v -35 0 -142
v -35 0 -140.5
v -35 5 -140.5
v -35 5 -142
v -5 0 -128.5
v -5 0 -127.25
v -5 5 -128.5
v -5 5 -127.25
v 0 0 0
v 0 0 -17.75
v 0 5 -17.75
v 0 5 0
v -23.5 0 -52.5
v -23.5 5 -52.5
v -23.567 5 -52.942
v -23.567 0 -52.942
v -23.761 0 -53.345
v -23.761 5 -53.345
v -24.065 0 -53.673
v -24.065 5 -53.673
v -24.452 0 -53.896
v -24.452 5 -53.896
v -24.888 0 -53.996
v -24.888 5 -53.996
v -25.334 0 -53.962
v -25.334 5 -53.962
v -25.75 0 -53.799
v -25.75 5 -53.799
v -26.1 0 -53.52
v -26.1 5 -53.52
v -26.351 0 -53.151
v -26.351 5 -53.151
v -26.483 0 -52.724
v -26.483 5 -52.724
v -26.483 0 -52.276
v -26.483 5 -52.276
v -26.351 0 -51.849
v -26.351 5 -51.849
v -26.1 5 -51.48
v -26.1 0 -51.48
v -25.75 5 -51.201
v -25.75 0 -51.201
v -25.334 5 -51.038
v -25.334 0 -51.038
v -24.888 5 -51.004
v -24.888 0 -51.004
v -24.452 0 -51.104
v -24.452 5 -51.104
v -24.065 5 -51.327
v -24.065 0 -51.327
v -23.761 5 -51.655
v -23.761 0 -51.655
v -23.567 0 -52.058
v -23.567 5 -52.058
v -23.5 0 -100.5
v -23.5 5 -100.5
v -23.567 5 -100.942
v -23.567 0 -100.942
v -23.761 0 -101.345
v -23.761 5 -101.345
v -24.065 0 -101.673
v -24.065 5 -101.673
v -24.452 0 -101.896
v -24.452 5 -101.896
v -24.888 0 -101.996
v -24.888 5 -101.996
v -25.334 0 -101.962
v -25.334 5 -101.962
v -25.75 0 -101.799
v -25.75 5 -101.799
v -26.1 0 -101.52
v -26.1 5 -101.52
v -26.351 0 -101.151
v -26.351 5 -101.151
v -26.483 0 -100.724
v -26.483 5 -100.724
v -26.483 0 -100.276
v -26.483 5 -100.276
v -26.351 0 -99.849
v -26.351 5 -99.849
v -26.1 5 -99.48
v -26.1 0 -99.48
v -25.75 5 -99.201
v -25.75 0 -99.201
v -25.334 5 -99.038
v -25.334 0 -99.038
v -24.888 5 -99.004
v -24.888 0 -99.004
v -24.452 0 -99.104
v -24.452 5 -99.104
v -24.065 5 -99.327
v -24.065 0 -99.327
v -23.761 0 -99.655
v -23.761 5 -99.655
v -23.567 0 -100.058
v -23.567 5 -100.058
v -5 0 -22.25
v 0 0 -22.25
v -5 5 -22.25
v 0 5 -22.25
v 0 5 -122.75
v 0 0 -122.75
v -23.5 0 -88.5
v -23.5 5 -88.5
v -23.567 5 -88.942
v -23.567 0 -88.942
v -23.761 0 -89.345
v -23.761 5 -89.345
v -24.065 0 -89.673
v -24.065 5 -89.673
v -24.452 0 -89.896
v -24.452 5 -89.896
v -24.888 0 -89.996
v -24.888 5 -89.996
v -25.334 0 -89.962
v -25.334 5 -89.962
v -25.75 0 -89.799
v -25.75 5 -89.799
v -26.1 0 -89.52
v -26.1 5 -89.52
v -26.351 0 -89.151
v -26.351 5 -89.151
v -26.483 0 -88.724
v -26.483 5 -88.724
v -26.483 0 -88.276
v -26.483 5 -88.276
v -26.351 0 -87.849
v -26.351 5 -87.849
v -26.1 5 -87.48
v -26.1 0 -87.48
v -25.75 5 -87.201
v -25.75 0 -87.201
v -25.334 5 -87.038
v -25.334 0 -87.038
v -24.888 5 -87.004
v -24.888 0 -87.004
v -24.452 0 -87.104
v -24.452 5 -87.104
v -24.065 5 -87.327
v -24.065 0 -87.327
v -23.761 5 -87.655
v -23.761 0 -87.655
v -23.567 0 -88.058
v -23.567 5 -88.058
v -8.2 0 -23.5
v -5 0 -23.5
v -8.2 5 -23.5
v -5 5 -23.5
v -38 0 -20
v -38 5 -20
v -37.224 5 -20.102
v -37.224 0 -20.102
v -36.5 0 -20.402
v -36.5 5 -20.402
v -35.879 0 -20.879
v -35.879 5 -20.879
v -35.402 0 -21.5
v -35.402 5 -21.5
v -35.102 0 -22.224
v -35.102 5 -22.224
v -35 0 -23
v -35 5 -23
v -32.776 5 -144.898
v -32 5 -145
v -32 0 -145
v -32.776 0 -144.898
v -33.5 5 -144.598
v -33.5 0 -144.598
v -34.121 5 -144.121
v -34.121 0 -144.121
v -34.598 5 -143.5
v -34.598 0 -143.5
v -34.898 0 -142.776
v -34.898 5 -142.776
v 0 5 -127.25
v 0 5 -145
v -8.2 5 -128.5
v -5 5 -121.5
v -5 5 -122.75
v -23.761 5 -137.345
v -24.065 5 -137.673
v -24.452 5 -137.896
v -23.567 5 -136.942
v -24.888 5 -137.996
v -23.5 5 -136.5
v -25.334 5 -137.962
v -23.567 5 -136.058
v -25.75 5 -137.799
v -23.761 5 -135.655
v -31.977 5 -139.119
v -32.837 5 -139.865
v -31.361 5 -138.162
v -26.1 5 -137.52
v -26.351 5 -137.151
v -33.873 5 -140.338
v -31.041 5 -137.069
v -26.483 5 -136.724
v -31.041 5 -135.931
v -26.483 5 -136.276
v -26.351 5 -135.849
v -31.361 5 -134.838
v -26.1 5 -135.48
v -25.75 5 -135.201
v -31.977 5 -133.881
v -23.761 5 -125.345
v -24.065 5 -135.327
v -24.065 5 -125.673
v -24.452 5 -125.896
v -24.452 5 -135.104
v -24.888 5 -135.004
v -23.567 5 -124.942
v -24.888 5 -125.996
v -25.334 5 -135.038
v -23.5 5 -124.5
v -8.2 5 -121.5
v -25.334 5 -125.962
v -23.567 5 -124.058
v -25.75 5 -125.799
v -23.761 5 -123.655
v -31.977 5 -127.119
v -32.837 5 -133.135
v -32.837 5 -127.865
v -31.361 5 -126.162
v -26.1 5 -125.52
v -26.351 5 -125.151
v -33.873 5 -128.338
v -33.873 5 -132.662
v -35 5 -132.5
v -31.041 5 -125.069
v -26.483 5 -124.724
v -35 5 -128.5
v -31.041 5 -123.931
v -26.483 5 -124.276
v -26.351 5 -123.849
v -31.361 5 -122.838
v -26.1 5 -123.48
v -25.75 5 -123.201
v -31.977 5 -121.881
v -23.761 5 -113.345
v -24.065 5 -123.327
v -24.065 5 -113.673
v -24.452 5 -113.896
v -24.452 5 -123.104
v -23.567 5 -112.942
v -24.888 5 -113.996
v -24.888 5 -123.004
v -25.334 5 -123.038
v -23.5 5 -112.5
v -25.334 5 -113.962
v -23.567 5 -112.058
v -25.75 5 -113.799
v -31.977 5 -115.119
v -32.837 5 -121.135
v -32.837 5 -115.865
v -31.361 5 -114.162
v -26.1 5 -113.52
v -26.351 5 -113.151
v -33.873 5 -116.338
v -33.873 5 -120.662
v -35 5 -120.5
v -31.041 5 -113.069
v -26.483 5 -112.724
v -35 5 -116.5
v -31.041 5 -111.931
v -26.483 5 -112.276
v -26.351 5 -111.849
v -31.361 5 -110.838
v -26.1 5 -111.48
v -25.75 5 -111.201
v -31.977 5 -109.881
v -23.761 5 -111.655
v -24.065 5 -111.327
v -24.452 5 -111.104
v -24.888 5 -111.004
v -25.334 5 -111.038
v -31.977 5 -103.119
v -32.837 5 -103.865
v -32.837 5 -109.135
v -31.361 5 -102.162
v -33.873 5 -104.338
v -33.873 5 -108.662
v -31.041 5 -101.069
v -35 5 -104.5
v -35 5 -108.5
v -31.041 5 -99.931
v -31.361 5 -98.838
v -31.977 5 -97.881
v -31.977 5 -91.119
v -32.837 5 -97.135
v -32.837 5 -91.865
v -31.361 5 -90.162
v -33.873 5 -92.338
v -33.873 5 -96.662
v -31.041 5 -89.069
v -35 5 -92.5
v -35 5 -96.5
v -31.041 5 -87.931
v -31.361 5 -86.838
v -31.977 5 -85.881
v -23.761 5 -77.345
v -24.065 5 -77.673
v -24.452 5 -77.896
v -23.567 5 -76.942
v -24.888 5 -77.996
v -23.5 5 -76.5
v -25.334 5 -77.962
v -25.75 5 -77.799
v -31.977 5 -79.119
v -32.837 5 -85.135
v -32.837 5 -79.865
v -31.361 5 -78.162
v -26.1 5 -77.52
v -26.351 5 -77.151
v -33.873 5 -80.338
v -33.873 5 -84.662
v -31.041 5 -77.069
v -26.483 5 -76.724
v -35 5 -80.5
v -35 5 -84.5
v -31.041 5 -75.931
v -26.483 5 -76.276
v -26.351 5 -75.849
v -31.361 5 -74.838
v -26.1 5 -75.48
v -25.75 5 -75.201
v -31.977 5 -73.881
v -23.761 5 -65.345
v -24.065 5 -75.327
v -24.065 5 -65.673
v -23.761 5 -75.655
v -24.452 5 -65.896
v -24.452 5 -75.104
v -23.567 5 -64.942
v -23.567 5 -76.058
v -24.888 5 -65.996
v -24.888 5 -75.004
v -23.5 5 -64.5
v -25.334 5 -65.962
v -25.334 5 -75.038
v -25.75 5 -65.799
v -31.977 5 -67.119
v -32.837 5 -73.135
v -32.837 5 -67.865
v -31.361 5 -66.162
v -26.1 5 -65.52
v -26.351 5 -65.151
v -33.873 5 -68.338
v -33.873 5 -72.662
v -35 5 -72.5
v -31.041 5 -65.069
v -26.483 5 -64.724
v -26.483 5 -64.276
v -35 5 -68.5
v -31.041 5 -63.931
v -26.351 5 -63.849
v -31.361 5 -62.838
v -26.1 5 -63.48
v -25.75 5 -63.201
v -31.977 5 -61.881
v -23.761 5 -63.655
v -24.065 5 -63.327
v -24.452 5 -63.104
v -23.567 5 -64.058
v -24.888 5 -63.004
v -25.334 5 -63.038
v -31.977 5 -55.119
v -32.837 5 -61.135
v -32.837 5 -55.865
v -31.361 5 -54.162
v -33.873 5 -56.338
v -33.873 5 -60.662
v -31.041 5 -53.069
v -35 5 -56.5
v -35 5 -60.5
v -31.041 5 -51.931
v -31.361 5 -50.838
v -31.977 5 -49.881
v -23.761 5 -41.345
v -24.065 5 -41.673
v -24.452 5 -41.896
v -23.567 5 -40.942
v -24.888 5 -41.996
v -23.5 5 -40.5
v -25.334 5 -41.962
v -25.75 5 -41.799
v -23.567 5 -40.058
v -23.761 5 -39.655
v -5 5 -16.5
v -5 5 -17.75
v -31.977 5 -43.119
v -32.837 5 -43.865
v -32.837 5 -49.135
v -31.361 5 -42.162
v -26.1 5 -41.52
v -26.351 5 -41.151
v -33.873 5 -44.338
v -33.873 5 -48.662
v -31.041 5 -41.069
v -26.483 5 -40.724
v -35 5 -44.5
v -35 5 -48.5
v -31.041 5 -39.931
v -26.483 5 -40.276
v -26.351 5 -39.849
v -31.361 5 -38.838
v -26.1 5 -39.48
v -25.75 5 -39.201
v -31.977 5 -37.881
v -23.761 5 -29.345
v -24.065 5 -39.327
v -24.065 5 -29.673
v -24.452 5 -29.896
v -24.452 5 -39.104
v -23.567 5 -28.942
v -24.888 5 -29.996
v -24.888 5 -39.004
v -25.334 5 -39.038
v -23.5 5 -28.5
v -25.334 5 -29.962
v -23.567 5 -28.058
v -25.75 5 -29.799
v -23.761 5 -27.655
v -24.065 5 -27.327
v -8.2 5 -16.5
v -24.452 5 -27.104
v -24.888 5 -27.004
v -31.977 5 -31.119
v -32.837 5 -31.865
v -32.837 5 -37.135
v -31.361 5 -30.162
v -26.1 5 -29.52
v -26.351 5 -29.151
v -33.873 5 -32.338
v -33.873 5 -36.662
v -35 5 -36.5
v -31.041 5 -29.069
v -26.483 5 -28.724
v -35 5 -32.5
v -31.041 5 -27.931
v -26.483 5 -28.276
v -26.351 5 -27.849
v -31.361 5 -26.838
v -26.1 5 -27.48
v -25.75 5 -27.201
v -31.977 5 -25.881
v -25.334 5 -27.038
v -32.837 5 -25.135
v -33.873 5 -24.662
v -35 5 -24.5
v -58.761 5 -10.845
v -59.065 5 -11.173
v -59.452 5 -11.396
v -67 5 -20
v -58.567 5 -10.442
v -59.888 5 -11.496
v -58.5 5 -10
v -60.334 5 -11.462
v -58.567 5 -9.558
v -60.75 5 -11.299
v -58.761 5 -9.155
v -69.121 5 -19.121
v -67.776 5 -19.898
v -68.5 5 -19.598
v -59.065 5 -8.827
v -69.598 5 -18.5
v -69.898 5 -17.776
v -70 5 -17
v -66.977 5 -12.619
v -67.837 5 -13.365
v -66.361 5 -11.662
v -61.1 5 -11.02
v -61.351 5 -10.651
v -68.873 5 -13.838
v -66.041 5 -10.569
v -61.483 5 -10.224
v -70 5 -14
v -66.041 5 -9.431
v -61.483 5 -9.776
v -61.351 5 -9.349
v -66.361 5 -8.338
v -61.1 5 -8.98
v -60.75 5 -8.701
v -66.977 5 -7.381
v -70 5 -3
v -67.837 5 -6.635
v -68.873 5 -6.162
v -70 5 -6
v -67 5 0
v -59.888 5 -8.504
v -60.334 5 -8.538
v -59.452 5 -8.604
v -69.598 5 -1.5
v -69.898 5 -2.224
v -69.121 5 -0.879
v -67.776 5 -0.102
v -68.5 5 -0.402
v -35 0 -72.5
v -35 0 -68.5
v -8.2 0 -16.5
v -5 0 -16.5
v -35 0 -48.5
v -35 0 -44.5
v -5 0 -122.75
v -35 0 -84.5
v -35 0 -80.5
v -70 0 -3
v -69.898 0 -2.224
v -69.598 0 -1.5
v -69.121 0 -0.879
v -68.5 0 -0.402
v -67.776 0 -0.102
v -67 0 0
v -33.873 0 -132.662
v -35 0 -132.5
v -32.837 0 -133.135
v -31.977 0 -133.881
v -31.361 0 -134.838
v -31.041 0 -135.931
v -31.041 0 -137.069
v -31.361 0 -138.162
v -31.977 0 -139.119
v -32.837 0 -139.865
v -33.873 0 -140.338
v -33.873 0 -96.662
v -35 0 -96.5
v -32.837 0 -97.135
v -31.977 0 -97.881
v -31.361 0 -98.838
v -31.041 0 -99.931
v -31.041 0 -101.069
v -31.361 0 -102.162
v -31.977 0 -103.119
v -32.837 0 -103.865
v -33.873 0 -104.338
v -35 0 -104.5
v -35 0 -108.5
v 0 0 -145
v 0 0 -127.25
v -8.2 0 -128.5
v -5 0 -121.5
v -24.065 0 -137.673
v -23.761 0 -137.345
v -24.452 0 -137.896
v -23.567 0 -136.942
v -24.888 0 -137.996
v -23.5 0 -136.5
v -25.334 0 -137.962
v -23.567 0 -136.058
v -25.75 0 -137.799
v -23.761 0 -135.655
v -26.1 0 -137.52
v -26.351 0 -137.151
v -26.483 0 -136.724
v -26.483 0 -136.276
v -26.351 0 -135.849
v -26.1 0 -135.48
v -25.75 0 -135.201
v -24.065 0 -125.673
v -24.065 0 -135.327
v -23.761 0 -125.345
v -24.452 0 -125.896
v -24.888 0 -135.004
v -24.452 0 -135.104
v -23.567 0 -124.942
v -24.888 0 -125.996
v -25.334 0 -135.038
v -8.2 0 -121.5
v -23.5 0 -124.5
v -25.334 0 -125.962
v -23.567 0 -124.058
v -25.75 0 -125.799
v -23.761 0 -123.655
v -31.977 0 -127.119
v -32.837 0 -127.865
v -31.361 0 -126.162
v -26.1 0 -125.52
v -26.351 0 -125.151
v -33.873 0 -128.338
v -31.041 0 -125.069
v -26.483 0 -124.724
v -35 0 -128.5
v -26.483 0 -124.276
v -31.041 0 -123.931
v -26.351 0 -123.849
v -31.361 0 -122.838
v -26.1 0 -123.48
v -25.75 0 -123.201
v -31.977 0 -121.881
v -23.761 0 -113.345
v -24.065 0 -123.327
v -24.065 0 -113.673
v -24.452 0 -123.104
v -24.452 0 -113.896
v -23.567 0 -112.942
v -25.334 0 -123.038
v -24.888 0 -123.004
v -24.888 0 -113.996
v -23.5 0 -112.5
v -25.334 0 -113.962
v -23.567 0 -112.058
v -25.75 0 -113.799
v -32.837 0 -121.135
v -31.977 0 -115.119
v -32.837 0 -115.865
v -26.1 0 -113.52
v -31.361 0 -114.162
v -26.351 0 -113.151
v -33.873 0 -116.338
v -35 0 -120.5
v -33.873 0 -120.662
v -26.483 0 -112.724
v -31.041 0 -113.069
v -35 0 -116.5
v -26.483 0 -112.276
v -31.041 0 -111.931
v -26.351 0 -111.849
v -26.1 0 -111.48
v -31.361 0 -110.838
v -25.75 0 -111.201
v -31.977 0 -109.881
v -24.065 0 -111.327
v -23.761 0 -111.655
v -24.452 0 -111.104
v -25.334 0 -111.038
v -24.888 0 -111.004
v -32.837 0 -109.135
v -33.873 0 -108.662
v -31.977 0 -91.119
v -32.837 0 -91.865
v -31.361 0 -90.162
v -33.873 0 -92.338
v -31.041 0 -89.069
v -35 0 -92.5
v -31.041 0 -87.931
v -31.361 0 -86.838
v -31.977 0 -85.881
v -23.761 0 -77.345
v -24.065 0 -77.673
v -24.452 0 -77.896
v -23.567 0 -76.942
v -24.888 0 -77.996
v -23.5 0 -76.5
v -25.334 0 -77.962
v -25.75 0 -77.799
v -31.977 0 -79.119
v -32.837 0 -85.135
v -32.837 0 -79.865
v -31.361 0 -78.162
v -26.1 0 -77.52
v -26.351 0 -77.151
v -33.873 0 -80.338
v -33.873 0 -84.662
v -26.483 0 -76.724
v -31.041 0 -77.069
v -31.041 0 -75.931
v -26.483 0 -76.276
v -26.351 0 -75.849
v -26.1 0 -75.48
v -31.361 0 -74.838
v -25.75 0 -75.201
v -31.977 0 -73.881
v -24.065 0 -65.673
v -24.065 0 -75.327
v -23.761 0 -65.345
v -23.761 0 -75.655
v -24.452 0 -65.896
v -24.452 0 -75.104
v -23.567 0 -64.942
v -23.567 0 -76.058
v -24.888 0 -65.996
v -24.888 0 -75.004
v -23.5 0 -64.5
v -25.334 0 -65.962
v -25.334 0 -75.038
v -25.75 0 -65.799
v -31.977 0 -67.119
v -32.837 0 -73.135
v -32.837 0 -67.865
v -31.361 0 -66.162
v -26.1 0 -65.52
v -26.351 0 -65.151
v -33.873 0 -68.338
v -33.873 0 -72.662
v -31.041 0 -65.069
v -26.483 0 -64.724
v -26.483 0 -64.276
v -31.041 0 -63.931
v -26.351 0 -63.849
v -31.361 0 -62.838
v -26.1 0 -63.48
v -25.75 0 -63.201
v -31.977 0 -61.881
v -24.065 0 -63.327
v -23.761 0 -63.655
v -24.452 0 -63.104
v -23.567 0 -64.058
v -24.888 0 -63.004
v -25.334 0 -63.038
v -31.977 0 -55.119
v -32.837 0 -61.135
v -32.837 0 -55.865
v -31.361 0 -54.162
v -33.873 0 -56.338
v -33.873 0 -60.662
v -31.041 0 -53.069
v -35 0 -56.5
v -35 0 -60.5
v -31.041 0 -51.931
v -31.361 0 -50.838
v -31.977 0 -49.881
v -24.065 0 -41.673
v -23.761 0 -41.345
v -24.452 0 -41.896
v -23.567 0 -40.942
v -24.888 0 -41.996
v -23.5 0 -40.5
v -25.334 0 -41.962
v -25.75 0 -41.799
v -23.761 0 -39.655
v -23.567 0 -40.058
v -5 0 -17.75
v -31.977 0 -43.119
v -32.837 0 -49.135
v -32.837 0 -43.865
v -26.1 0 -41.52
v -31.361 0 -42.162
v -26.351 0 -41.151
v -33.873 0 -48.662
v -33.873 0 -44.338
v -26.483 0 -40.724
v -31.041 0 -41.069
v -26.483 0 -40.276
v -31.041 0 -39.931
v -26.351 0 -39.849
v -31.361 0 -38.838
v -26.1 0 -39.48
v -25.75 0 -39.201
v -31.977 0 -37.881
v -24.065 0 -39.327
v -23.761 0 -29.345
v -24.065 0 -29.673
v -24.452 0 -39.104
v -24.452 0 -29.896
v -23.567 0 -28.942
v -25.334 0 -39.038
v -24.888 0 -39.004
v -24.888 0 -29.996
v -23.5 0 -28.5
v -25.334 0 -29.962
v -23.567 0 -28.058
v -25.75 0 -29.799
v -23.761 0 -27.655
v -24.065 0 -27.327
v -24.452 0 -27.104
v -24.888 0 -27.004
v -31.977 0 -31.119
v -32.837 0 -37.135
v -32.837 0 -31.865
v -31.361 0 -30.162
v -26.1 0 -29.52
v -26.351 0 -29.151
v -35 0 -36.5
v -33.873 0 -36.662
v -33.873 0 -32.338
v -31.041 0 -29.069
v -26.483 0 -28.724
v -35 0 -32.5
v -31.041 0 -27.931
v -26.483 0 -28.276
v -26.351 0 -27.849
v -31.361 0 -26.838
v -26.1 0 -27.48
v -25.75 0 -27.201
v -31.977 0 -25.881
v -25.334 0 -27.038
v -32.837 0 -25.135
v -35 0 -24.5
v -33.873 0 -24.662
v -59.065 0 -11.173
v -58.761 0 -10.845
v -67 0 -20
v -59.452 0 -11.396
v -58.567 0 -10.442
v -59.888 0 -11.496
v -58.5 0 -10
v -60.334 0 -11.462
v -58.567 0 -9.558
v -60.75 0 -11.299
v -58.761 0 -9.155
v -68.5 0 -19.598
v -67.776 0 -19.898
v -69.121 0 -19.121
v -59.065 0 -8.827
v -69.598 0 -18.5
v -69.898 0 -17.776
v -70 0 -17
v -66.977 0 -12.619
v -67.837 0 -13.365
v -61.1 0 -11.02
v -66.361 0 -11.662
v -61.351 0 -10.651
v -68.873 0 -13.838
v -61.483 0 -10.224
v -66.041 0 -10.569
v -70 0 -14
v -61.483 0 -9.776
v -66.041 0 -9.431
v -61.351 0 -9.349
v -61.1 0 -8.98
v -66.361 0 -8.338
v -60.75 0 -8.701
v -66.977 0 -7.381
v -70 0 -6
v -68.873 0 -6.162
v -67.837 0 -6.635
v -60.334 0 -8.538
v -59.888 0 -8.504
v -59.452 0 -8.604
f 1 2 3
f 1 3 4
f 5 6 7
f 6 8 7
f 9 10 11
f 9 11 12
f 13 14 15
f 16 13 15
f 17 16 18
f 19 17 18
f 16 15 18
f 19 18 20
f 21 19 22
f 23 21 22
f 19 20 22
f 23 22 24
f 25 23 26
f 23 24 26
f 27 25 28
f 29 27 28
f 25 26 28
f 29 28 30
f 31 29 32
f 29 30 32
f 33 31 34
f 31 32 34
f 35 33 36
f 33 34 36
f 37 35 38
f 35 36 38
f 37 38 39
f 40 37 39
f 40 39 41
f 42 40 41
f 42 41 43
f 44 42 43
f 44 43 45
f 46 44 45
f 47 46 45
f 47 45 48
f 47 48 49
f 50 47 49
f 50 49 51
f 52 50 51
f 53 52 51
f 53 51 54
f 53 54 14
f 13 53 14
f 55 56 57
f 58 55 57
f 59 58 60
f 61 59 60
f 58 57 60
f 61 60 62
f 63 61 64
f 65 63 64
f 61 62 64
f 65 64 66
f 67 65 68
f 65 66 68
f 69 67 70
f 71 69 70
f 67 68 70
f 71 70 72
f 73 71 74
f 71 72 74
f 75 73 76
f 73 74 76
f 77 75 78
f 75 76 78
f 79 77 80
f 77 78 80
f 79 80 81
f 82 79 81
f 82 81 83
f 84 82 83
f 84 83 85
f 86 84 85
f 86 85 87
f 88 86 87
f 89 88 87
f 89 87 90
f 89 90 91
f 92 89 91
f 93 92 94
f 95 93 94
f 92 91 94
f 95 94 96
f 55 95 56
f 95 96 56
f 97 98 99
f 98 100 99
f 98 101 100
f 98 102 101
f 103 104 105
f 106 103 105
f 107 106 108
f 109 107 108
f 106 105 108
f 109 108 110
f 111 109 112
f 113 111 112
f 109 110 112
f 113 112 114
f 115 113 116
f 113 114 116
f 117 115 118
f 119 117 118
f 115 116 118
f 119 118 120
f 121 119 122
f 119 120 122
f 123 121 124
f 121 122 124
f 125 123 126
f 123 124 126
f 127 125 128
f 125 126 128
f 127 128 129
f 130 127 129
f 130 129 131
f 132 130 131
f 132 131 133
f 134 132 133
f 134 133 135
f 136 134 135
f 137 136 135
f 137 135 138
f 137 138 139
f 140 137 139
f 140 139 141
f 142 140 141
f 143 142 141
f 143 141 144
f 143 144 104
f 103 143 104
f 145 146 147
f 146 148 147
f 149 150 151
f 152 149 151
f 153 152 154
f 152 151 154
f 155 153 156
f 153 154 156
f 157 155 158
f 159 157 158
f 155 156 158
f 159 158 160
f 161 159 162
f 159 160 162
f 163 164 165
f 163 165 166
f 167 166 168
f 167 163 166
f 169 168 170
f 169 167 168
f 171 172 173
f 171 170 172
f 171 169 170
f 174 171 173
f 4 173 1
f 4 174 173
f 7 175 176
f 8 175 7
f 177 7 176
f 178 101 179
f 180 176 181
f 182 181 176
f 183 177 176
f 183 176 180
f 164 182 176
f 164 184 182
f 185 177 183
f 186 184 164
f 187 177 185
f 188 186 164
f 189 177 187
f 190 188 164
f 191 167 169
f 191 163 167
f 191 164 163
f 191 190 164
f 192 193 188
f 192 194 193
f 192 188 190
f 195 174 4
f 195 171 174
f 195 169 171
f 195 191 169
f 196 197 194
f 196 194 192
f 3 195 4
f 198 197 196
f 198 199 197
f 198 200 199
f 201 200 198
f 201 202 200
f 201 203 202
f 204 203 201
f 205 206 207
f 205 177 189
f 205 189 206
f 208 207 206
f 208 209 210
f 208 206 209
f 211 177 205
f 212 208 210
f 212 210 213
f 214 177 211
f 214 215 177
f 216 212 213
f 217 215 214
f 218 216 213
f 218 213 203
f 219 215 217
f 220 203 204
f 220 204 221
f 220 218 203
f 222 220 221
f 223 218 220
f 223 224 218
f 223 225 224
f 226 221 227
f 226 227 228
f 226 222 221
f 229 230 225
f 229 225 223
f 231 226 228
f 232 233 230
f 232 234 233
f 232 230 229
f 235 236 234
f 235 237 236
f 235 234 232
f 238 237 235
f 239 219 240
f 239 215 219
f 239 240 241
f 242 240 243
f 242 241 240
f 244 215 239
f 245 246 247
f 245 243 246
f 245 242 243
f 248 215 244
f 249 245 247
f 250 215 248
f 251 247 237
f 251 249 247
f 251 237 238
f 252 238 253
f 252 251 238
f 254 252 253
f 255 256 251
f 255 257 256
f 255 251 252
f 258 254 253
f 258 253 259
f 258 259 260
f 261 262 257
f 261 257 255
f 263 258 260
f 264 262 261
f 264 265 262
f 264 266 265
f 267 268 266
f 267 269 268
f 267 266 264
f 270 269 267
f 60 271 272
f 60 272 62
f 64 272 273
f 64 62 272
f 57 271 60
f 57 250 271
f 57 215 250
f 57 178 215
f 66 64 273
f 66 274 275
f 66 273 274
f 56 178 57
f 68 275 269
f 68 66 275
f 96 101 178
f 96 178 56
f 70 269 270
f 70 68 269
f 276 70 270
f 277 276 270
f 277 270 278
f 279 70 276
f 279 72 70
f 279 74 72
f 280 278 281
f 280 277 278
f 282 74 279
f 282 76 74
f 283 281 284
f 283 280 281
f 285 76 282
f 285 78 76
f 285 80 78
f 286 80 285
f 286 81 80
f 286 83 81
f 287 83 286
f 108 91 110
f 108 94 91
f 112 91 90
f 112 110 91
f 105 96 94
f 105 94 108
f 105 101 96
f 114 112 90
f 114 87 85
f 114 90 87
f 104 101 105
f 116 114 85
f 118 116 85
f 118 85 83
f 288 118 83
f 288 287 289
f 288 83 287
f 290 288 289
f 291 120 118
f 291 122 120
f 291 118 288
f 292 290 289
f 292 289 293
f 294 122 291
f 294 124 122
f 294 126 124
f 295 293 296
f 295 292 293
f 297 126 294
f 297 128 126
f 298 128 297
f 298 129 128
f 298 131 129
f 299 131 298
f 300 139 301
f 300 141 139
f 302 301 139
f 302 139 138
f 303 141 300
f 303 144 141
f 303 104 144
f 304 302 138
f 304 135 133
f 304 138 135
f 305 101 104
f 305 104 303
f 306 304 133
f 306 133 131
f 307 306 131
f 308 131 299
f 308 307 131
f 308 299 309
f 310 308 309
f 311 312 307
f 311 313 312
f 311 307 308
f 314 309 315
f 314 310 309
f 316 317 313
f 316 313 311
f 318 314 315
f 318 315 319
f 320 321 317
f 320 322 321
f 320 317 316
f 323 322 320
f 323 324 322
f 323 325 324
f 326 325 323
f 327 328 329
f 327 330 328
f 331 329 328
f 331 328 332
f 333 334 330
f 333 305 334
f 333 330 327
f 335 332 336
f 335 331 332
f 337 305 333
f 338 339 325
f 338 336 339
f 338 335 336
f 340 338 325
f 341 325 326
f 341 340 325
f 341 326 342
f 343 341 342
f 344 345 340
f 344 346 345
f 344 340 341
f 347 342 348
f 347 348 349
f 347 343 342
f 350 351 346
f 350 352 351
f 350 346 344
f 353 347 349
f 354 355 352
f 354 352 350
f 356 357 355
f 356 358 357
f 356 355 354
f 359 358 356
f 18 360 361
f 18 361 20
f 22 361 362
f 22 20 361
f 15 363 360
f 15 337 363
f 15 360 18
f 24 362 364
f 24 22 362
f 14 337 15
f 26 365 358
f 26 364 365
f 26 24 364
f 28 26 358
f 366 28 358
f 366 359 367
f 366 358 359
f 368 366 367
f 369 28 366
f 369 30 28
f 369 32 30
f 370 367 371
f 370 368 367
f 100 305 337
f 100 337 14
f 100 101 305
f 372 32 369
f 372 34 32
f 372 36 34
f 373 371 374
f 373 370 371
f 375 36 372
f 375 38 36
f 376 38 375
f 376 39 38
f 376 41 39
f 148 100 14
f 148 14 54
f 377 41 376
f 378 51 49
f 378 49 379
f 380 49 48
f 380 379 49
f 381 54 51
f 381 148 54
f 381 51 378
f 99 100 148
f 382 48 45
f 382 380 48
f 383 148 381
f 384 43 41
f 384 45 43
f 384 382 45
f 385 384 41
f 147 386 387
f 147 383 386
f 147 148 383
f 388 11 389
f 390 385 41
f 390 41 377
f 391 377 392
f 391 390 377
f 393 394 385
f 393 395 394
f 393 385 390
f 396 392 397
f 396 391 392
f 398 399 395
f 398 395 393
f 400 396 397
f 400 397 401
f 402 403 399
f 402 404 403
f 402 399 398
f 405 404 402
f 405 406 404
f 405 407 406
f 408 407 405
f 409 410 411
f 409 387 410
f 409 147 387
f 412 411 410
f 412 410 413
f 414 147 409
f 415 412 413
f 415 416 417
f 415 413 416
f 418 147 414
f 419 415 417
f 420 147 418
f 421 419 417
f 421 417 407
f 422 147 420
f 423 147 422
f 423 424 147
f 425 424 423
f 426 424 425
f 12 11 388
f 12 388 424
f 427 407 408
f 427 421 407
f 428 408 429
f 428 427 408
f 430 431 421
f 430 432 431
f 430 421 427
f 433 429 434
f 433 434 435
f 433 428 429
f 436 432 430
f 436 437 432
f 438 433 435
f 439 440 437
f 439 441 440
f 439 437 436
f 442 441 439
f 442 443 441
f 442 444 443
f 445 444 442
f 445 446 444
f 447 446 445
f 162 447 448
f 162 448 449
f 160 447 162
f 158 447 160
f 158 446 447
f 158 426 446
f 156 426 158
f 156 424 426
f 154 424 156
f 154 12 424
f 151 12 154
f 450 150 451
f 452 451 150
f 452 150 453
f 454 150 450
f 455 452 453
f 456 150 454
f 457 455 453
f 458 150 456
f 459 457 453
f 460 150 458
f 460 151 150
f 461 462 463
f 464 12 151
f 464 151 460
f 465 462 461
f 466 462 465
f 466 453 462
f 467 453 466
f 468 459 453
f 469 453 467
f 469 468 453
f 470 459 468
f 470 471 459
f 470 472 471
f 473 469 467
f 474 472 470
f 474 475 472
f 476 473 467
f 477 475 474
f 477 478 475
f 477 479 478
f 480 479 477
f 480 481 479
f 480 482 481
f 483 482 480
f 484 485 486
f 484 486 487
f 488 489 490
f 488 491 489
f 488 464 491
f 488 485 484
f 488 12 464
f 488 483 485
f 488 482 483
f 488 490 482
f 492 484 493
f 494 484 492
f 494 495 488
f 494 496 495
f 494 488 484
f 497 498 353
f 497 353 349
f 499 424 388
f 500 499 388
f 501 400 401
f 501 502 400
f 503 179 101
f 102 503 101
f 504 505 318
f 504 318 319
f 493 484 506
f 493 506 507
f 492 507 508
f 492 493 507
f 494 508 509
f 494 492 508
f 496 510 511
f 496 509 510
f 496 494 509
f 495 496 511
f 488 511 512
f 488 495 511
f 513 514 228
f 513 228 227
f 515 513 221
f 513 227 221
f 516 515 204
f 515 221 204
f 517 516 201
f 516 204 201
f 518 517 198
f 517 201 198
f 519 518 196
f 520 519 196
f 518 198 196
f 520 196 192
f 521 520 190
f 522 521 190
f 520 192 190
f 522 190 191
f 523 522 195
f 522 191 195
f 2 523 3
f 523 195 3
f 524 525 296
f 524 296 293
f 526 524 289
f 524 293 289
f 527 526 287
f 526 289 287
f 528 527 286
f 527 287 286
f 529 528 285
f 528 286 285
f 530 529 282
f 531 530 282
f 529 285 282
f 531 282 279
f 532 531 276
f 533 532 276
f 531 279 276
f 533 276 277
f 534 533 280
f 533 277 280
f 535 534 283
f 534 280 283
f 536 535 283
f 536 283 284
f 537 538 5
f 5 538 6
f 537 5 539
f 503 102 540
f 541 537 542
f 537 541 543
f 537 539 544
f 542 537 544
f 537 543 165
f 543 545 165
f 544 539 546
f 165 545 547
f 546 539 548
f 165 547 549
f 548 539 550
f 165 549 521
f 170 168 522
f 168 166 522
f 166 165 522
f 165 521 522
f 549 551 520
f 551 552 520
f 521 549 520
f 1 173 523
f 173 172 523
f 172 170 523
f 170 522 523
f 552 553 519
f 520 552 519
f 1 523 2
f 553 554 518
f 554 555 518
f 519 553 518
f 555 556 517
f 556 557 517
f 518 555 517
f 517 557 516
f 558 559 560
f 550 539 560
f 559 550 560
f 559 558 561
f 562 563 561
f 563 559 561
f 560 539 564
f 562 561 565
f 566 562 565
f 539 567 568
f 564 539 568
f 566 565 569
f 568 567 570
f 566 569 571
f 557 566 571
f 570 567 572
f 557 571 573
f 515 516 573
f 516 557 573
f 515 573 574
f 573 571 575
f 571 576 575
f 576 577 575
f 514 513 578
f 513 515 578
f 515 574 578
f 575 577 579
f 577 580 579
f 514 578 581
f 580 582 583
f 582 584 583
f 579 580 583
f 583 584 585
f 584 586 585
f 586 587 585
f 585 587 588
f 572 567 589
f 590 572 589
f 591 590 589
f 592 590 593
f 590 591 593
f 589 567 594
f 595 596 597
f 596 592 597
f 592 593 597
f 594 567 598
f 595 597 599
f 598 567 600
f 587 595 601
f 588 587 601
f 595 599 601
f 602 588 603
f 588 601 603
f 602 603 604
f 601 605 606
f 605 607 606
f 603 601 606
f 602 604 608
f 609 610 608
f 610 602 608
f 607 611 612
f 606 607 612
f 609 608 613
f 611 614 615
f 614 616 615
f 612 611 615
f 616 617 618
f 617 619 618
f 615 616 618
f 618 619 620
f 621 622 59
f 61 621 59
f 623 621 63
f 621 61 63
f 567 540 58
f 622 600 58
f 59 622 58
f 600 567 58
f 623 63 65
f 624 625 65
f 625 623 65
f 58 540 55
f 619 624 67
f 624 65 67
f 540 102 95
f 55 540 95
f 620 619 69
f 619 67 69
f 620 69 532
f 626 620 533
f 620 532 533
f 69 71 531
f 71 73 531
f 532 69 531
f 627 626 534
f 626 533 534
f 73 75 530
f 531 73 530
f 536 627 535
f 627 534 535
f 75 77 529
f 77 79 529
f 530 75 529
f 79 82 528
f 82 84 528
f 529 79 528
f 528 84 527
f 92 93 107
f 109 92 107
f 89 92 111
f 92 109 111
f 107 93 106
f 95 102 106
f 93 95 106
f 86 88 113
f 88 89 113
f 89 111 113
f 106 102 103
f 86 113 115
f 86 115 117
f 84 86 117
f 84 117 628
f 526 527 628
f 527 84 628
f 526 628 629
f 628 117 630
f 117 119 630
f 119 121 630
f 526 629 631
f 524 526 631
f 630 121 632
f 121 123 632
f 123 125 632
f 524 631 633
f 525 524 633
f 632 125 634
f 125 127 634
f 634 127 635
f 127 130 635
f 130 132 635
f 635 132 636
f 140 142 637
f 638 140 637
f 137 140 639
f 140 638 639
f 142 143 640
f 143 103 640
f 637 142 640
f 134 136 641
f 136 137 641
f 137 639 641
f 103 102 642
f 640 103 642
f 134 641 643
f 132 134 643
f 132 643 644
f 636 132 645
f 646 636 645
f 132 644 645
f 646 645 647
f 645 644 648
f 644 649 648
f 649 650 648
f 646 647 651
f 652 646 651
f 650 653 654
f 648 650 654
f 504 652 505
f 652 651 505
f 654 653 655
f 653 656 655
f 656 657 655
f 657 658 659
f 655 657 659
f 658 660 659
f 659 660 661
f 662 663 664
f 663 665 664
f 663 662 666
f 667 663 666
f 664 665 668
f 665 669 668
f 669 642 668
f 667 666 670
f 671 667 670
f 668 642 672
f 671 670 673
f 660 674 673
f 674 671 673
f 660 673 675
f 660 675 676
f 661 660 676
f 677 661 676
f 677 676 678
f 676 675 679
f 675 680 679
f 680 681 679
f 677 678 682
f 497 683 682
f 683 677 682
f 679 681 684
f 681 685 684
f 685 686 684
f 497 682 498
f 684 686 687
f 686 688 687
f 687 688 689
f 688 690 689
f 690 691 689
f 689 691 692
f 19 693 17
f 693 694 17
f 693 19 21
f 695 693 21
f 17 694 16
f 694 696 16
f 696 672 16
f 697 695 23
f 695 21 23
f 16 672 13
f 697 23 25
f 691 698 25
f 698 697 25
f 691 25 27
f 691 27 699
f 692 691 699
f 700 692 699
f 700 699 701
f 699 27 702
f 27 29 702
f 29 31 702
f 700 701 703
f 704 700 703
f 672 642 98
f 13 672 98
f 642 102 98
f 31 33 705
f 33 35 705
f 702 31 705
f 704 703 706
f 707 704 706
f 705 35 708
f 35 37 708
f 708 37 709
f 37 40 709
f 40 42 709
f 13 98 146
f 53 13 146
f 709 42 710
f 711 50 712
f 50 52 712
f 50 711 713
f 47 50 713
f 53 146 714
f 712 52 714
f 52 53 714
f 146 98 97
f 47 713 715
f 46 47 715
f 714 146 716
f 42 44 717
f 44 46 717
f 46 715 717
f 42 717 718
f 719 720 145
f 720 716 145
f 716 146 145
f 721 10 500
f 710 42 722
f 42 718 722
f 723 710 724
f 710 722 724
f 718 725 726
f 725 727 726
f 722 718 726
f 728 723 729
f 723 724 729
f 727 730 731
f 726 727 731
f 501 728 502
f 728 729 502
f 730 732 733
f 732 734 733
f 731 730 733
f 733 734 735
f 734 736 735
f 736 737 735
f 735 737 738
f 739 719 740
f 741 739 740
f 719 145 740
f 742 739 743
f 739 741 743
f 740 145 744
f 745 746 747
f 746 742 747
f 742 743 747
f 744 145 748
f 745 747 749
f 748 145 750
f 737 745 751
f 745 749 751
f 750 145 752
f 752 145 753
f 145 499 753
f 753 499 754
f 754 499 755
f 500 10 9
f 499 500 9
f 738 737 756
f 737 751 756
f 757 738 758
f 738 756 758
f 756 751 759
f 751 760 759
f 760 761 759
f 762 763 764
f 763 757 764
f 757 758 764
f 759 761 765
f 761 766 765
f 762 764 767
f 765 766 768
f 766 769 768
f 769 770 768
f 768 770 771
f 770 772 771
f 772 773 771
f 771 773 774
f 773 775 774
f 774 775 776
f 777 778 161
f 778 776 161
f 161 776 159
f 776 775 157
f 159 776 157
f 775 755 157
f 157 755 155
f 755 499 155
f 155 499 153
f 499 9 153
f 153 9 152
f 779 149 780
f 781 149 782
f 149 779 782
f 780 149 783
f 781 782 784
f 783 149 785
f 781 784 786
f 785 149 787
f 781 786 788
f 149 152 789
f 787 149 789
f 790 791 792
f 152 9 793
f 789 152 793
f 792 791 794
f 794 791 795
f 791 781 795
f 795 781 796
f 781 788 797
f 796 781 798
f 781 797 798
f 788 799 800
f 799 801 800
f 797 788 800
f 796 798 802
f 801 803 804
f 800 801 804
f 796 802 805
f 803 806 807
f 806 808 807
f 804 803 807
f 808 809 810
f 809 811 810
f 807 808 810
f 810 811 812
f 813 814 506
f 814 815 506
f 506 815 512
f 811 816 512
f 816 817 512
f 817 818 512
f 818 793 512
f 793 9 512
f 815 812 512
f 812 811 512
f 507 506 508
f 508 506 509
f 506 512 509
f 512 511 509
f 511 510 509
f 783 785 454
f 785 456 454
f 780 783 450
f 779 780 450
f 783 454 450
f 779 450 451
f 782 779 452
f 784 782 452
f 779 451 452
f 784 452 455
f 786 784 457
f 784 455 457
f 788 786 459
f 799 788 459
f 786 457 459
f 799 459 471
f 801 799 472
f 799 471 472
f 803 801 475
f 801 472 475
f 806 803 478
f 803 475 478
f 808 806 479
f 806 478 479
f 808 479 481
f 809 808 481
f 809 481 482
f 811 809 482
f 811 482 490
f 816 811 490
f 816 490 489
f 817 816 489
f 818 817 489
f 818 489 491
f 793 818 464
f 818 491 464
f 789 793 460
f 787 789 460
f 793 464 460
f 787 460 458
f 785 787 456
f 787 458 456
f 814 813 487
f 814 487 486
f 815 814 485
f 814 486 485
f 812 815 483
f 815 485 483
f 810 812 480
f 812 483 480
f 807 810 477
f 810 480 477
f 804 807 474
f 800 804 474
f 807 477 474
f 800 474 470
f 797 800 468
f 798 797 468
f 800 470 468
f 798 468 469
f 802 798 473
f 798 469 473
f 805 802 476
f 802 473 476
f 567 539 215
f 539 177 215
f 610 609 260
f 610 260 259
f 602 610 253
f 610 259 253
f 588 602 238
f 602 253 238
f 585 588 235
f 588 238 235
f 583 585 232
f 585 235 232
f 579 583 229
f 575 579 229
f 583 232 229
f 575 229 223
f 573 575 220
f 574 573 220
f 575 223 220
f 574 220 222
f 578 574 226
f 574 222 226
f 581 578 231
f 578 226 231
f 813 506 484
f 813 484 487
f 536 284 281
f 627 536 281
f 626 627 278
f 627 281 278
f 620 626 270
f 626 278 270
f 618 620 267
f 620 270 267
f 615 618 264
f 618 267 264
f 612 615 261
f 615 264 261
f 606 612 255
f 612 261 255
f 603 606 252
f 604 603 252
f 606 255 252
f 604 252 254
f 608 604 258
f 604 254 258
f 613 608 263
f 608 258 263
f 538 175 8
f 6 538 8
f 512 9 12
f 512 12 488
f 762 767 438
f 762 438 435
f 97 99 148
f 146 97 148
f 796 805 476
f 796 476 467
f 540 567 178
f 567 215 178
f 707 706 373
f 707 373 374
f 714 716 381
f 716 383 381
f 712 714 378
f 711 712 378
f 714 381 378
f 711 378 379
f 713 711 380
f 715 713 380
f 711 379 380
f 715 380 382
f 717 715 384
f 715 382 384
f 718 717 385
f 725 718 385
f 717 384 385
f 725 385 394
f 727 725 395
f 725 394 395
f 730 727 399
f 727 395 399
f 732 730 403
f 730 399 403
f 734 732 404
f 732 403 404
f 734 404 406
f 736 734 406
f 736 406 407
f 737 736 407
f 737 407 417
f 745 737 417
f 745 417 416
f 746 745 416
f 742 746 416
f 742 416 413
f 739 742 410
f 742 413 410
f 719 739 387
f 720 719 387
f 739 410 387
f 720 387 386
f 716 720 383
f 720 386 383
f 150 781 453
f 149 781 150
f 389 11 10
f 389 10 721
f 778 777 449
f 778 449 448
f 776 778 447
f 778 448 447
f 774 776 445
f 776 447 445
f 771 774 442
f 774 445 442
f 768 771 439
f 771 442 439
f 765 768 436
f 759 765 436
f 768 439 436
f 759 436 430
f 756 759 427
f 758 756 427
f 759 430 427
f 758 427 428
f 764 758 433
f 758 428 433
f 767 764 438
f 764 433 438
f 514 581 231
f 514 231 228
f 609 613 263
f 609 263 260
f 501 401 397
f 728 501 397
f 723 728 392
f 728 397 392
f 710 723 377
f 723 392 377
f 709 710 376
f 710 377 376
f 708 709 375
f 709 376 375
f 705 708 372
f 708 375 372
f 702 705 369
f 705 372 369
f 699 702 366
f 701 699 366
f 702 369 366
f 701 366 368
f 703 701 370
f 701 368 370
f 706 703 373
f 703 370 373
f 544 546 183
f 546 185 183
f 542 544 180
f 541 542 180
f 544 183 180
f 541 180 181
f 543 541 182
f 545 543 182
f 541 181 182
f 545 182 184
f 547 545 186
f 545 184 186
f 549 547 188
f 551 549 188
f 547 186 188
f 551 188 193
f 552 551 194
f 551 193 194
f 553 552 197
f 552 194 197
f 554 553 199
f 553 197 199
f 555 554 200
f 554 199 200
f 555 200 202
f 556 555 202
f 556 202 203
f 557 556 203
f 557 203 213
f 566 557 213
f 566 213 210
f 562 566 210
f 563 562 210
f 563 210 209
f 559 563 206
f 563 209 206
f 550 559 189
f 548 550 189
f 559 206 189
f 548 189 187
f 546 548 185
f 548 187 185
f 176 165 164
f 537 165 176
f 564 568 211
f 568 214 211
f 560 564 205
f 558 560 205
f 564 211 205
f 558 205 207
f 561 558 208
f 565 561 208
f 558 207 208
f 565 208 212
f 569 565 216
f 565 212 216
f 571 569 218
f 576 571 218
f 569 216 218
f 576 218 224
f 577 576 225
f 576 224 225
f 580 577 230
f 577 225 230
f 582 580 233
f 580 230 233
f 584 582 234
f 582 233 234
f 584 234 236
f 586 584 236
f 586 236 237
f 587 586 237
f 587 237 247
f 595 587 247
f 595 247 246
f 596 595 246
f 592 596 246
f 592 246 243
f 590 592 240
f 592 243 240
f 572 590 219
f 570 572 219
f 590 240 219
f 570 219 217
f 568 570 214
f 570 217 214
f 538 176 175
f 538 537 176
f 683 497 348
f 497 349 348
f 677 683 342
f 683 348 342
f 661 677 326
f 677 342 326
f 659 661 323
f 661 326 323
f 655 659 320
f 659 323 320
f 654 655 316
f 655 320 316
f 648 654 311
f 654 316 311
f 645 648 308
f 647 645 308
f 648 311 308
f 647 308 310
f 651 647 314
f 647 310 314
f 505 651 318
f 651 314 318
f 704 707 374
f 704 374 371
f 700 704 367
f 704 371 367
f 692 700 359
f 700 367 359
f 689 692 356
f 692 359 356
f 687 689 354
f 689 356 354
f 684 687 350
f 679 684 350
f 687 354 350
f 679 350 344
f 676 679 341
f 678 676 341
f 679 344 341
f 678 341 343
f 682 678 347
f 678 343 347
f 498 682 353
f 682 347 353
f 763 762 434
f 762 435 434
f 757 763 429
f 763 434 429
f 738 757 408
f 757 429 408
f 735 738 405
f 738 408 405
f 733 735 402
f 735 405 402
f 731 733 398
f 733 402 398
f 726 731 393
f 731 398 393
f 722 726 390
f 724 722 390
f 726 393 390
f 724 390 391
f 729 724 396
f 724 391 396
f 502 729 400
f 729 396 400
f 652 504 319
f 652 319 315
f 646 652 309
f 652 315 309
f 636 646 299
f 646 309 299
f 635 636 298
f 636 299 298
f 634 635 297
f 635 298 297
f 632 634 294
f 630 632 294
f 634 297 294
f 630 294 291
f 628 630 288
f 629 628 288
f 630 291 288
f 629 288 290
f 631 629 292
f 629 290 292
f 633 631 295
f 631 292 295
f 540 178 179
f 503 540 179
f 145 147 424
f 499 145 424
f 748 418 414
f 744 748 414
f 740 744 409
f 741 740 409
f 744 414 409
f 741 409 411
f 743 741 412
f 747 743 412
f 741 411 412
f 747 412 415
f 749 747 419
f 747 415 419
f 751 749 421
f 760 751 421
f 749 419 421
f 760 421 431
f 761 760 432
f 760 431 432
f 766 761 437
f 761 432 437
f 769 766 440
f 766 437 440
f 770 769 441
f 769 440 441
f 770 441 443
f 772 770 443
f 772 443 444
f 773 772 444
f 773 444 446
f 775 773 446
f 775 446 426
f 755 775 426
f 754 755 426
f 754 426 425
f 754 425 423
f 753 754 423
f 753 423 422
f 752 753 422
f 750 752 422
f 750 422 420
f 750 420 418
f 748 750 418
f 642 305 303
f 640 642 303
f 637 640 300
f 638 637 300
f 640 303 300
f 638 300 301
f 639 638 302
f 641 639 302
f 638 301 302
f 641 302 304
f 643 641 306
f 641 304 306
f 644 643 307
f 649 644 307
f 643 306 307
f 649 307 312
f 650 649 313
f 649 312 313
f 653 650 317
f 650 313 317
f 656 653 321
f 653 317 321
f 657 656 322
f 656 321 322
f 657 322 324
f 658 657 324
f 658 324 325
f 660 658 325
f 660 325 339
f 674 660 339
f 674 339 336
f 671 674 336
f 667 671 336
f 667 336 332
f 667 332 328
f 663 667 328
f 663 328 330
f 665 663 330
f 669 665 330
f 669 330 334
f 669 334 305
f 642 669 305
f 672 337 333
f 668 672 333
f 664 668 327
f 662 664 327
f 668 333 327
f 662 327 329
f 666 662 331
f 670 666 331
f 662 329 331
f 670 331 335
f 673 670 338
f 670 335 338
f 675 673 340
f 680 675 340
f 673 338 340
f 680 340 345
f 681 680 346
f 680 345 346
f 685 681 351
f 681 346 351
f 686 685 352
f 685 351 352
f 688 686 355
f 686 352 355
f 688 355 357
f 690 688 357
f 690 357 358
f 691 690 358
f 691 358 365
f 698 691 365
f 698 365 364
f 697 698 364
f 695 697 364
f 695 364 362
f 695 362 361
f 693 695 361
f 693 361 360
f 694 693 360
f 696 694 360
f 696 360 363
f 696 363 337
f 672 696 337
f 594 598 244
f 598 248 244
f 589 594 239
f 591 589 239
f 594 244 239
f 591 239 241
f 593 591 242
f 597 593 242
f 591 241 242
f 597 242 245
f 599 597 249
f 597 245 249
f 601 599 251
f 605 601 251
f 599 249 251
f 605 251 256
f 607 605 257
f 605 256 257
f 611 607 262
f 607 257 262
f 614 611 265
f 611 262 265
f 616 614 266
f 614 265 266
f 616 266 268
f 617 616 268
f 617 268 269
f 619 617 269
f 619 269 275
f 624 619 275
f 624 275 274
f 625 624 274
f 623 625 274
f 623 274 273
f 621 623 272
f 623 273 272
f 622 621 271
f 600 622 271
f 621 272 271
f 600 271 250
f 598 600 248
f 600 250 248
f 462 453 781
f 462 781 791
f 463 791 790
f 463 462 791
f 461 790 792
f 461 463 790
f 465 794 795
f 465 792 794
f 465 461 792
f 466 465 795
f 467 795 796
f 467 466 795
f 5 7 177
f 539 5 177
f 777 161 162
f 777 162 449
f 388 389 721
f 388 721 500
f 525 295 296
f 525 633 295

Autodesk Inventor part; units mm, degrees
ref_plane "YZ Plane" through (0, 0, 0) normal (1, 0, 0) x (0, 1, 0)
ref_plane "XZ Plane" through (0, 0, 0) normal (0, 1, 0) x (-1, 0, 0)
ref_plane "XY Plane" through (0, 0, 0) normal (0, 0, 1) x (1, 0, 0)
sketch "Sketch1" plane through (0, 0, 0) normal (0, 1, 0) x (-1, 0, 0)
  line L0 (0, 0) -> (70, 0)
  line L1 (70, 0) -> (70, -20)
  line L2 (70, -20) -> (35, -20)
  line L3 (35, -20) -> (35, -145)
  line L4 (35, -145) -> (0, -145)
  line L5 (0, -145) -> (0, 0)
  dimension "d0" = 35
  dimension "d1" = 145
  dimension "d2" = 70
  dimension "d3" = 20
extrude "Extrusion1" add sketch "Sketch1" along normal blind 5
sketch "Sketch2" plane through (0, 5, 0) normal (0, 1, 0) x (1, 0, 0)
  line L0 (-70, 20) -> (-70, 0) projected
  circle A0 centre (-70, 10) radius 4
  line L1 (-35, 145) -> (-35, 20) projected
  circle A1 centre (-35, 64.5) radius 4
  circle A2 centre (-35, 76.5) radius 4
  circle A3 centre (-35, 88.5) radius 4
  circle A4 centre (-35, 100.5) radius 4
  circle A5 centre (-35, 112.5) radius 4
  circle A6 centre (-35, 124.5) radius 4
  circle A7 centre (-35, 136.5) radius 4
  circle A8 centre (-35, 52.5) radius 4
  circle A9 centre (-35, 40.5) radius 4
  circle A10 centre (-35, 28.5) radius 4
  line L2 (0, 17.75) -> (0, 22.25)
  line L3 (0, 22.25) -> (-5, 22.25)
  line L4 (-5, 22.25) -> (-5, 23.5)
  line L5 (-5, 23.5) -> (-8.2, 23.5)
  line L6 (-8.2, 23.5) -> (-8.2, 16.5)
  line L7 (-8.2, 16.5) -> (-5, 16.5)
  line L8 (0, 17.75) -> (-5, 17.75)
  line L9 (-5, 17.75) -> (-5, 16.5)
  line L10 (0, 0) -> (0, 145) projected
  line L11 (0, 127.25) -> (-5, 127.25)
  line L12 (-5, 127.25) -> (-5, 128.5)
  line L13 (-5, 128.5) -> (-8.2, 128.5)
  line L14 (-8.2, 128.5) -> (-8.2, 121.5)
  line L15 (-8.2, 121.5) -> (-5, 121.5)
  line L16 (-5, 121.5) -> (-5, 122.75)
  line L17 (-5, 122.75) -> (0, 122.75)
  line L18 (0, 122.75) -> (0, 127.25)
  line L19 (-25, 28.5) -> (-25, 136.5) construction
  circle A11 centre (-25, 28.5) radius 1.5
  circle A12 centre (-25, 40.5) radius 1.5
  circle A13 centre (-25, 52.5) radius 1.5
  circle A14 centre (-25, 64.5) radius 1.5
  circle A15 centre (-25, 76.5) radius 1.5
  circle A16 centre (-25, 88.5) radius 1.5
  circle A17 centre (-25, 100.5) radius 1.5
  circle A18 centre (-25, 112.5) radius 1.5
  circle A19 centre (-25, 124.5) radius 1.5
  circle A20 centre (-25, 136.5) radius 1.5
  circle A21 centre (-60, 10) radius 1.5
  point P0 (-8.2, 125)
  point P1 (0, 125)
  point P2 (-8.2, 20)
  point P3 (0, 20)
  dimension "d6" = 8
  dimension "d7" = 8
  dimension "d8" = 8
  dimension "d9" = 8
  dimension "d11" = 8
  dimension "d12" = 8
  dimension "d13" = 8
  dimension "d14" = 8
  dimension "d15" = 8.5
  dimension "d16" = 12
  dimension "d17" = 12
  dimension "d18" = 12
  dimension "d19" = 12
  dimension "d20" = 12
  dimension "d21" = 12
  dimension "d22" = 8
  dimension "d23" = 8
  dimension "d24" = 12
  dimension "d25" = 12
  dimension "d26" = 12
  dimension "d27" = 8
  dimension "d28" = 7
  dimension "d29" = 3.2
  dimension "d30" = 4.5
  dimension "d31" = 5
  dimension "d32" = 3.2
  dimension "d33" = 5
  dimension "d34" = 7
  dimension "d35" = 4.5
  dimension "d36" = 20
  dimension "d37" = 20
  dimension "d38" = 3
  dimension "d39" = 3
  dimension "d40" = 3
  dimension "d41" = 3
  dimension "d42" = 3
  dimension "d43" = 3
  dimension "d44" = 3
  dimension "d45" = 3
  dimension "d46" = 3
  dimension "d47" = 3
  dimension "d48" = 10
  dimension "d52" = 3
  dimension "d53" = 10
extrude "Extrusion2" cut sketch "Sketch2" against normal blind 5
fillet "Fillet1" radius 3 4 edges at (-35, 2.5, -145) (-35, 2.5, -20) (-70, 2.5, -20) (-70, 2.5, 0)
properties part number "primary_holder" material "Polycarbonate, Clear"
